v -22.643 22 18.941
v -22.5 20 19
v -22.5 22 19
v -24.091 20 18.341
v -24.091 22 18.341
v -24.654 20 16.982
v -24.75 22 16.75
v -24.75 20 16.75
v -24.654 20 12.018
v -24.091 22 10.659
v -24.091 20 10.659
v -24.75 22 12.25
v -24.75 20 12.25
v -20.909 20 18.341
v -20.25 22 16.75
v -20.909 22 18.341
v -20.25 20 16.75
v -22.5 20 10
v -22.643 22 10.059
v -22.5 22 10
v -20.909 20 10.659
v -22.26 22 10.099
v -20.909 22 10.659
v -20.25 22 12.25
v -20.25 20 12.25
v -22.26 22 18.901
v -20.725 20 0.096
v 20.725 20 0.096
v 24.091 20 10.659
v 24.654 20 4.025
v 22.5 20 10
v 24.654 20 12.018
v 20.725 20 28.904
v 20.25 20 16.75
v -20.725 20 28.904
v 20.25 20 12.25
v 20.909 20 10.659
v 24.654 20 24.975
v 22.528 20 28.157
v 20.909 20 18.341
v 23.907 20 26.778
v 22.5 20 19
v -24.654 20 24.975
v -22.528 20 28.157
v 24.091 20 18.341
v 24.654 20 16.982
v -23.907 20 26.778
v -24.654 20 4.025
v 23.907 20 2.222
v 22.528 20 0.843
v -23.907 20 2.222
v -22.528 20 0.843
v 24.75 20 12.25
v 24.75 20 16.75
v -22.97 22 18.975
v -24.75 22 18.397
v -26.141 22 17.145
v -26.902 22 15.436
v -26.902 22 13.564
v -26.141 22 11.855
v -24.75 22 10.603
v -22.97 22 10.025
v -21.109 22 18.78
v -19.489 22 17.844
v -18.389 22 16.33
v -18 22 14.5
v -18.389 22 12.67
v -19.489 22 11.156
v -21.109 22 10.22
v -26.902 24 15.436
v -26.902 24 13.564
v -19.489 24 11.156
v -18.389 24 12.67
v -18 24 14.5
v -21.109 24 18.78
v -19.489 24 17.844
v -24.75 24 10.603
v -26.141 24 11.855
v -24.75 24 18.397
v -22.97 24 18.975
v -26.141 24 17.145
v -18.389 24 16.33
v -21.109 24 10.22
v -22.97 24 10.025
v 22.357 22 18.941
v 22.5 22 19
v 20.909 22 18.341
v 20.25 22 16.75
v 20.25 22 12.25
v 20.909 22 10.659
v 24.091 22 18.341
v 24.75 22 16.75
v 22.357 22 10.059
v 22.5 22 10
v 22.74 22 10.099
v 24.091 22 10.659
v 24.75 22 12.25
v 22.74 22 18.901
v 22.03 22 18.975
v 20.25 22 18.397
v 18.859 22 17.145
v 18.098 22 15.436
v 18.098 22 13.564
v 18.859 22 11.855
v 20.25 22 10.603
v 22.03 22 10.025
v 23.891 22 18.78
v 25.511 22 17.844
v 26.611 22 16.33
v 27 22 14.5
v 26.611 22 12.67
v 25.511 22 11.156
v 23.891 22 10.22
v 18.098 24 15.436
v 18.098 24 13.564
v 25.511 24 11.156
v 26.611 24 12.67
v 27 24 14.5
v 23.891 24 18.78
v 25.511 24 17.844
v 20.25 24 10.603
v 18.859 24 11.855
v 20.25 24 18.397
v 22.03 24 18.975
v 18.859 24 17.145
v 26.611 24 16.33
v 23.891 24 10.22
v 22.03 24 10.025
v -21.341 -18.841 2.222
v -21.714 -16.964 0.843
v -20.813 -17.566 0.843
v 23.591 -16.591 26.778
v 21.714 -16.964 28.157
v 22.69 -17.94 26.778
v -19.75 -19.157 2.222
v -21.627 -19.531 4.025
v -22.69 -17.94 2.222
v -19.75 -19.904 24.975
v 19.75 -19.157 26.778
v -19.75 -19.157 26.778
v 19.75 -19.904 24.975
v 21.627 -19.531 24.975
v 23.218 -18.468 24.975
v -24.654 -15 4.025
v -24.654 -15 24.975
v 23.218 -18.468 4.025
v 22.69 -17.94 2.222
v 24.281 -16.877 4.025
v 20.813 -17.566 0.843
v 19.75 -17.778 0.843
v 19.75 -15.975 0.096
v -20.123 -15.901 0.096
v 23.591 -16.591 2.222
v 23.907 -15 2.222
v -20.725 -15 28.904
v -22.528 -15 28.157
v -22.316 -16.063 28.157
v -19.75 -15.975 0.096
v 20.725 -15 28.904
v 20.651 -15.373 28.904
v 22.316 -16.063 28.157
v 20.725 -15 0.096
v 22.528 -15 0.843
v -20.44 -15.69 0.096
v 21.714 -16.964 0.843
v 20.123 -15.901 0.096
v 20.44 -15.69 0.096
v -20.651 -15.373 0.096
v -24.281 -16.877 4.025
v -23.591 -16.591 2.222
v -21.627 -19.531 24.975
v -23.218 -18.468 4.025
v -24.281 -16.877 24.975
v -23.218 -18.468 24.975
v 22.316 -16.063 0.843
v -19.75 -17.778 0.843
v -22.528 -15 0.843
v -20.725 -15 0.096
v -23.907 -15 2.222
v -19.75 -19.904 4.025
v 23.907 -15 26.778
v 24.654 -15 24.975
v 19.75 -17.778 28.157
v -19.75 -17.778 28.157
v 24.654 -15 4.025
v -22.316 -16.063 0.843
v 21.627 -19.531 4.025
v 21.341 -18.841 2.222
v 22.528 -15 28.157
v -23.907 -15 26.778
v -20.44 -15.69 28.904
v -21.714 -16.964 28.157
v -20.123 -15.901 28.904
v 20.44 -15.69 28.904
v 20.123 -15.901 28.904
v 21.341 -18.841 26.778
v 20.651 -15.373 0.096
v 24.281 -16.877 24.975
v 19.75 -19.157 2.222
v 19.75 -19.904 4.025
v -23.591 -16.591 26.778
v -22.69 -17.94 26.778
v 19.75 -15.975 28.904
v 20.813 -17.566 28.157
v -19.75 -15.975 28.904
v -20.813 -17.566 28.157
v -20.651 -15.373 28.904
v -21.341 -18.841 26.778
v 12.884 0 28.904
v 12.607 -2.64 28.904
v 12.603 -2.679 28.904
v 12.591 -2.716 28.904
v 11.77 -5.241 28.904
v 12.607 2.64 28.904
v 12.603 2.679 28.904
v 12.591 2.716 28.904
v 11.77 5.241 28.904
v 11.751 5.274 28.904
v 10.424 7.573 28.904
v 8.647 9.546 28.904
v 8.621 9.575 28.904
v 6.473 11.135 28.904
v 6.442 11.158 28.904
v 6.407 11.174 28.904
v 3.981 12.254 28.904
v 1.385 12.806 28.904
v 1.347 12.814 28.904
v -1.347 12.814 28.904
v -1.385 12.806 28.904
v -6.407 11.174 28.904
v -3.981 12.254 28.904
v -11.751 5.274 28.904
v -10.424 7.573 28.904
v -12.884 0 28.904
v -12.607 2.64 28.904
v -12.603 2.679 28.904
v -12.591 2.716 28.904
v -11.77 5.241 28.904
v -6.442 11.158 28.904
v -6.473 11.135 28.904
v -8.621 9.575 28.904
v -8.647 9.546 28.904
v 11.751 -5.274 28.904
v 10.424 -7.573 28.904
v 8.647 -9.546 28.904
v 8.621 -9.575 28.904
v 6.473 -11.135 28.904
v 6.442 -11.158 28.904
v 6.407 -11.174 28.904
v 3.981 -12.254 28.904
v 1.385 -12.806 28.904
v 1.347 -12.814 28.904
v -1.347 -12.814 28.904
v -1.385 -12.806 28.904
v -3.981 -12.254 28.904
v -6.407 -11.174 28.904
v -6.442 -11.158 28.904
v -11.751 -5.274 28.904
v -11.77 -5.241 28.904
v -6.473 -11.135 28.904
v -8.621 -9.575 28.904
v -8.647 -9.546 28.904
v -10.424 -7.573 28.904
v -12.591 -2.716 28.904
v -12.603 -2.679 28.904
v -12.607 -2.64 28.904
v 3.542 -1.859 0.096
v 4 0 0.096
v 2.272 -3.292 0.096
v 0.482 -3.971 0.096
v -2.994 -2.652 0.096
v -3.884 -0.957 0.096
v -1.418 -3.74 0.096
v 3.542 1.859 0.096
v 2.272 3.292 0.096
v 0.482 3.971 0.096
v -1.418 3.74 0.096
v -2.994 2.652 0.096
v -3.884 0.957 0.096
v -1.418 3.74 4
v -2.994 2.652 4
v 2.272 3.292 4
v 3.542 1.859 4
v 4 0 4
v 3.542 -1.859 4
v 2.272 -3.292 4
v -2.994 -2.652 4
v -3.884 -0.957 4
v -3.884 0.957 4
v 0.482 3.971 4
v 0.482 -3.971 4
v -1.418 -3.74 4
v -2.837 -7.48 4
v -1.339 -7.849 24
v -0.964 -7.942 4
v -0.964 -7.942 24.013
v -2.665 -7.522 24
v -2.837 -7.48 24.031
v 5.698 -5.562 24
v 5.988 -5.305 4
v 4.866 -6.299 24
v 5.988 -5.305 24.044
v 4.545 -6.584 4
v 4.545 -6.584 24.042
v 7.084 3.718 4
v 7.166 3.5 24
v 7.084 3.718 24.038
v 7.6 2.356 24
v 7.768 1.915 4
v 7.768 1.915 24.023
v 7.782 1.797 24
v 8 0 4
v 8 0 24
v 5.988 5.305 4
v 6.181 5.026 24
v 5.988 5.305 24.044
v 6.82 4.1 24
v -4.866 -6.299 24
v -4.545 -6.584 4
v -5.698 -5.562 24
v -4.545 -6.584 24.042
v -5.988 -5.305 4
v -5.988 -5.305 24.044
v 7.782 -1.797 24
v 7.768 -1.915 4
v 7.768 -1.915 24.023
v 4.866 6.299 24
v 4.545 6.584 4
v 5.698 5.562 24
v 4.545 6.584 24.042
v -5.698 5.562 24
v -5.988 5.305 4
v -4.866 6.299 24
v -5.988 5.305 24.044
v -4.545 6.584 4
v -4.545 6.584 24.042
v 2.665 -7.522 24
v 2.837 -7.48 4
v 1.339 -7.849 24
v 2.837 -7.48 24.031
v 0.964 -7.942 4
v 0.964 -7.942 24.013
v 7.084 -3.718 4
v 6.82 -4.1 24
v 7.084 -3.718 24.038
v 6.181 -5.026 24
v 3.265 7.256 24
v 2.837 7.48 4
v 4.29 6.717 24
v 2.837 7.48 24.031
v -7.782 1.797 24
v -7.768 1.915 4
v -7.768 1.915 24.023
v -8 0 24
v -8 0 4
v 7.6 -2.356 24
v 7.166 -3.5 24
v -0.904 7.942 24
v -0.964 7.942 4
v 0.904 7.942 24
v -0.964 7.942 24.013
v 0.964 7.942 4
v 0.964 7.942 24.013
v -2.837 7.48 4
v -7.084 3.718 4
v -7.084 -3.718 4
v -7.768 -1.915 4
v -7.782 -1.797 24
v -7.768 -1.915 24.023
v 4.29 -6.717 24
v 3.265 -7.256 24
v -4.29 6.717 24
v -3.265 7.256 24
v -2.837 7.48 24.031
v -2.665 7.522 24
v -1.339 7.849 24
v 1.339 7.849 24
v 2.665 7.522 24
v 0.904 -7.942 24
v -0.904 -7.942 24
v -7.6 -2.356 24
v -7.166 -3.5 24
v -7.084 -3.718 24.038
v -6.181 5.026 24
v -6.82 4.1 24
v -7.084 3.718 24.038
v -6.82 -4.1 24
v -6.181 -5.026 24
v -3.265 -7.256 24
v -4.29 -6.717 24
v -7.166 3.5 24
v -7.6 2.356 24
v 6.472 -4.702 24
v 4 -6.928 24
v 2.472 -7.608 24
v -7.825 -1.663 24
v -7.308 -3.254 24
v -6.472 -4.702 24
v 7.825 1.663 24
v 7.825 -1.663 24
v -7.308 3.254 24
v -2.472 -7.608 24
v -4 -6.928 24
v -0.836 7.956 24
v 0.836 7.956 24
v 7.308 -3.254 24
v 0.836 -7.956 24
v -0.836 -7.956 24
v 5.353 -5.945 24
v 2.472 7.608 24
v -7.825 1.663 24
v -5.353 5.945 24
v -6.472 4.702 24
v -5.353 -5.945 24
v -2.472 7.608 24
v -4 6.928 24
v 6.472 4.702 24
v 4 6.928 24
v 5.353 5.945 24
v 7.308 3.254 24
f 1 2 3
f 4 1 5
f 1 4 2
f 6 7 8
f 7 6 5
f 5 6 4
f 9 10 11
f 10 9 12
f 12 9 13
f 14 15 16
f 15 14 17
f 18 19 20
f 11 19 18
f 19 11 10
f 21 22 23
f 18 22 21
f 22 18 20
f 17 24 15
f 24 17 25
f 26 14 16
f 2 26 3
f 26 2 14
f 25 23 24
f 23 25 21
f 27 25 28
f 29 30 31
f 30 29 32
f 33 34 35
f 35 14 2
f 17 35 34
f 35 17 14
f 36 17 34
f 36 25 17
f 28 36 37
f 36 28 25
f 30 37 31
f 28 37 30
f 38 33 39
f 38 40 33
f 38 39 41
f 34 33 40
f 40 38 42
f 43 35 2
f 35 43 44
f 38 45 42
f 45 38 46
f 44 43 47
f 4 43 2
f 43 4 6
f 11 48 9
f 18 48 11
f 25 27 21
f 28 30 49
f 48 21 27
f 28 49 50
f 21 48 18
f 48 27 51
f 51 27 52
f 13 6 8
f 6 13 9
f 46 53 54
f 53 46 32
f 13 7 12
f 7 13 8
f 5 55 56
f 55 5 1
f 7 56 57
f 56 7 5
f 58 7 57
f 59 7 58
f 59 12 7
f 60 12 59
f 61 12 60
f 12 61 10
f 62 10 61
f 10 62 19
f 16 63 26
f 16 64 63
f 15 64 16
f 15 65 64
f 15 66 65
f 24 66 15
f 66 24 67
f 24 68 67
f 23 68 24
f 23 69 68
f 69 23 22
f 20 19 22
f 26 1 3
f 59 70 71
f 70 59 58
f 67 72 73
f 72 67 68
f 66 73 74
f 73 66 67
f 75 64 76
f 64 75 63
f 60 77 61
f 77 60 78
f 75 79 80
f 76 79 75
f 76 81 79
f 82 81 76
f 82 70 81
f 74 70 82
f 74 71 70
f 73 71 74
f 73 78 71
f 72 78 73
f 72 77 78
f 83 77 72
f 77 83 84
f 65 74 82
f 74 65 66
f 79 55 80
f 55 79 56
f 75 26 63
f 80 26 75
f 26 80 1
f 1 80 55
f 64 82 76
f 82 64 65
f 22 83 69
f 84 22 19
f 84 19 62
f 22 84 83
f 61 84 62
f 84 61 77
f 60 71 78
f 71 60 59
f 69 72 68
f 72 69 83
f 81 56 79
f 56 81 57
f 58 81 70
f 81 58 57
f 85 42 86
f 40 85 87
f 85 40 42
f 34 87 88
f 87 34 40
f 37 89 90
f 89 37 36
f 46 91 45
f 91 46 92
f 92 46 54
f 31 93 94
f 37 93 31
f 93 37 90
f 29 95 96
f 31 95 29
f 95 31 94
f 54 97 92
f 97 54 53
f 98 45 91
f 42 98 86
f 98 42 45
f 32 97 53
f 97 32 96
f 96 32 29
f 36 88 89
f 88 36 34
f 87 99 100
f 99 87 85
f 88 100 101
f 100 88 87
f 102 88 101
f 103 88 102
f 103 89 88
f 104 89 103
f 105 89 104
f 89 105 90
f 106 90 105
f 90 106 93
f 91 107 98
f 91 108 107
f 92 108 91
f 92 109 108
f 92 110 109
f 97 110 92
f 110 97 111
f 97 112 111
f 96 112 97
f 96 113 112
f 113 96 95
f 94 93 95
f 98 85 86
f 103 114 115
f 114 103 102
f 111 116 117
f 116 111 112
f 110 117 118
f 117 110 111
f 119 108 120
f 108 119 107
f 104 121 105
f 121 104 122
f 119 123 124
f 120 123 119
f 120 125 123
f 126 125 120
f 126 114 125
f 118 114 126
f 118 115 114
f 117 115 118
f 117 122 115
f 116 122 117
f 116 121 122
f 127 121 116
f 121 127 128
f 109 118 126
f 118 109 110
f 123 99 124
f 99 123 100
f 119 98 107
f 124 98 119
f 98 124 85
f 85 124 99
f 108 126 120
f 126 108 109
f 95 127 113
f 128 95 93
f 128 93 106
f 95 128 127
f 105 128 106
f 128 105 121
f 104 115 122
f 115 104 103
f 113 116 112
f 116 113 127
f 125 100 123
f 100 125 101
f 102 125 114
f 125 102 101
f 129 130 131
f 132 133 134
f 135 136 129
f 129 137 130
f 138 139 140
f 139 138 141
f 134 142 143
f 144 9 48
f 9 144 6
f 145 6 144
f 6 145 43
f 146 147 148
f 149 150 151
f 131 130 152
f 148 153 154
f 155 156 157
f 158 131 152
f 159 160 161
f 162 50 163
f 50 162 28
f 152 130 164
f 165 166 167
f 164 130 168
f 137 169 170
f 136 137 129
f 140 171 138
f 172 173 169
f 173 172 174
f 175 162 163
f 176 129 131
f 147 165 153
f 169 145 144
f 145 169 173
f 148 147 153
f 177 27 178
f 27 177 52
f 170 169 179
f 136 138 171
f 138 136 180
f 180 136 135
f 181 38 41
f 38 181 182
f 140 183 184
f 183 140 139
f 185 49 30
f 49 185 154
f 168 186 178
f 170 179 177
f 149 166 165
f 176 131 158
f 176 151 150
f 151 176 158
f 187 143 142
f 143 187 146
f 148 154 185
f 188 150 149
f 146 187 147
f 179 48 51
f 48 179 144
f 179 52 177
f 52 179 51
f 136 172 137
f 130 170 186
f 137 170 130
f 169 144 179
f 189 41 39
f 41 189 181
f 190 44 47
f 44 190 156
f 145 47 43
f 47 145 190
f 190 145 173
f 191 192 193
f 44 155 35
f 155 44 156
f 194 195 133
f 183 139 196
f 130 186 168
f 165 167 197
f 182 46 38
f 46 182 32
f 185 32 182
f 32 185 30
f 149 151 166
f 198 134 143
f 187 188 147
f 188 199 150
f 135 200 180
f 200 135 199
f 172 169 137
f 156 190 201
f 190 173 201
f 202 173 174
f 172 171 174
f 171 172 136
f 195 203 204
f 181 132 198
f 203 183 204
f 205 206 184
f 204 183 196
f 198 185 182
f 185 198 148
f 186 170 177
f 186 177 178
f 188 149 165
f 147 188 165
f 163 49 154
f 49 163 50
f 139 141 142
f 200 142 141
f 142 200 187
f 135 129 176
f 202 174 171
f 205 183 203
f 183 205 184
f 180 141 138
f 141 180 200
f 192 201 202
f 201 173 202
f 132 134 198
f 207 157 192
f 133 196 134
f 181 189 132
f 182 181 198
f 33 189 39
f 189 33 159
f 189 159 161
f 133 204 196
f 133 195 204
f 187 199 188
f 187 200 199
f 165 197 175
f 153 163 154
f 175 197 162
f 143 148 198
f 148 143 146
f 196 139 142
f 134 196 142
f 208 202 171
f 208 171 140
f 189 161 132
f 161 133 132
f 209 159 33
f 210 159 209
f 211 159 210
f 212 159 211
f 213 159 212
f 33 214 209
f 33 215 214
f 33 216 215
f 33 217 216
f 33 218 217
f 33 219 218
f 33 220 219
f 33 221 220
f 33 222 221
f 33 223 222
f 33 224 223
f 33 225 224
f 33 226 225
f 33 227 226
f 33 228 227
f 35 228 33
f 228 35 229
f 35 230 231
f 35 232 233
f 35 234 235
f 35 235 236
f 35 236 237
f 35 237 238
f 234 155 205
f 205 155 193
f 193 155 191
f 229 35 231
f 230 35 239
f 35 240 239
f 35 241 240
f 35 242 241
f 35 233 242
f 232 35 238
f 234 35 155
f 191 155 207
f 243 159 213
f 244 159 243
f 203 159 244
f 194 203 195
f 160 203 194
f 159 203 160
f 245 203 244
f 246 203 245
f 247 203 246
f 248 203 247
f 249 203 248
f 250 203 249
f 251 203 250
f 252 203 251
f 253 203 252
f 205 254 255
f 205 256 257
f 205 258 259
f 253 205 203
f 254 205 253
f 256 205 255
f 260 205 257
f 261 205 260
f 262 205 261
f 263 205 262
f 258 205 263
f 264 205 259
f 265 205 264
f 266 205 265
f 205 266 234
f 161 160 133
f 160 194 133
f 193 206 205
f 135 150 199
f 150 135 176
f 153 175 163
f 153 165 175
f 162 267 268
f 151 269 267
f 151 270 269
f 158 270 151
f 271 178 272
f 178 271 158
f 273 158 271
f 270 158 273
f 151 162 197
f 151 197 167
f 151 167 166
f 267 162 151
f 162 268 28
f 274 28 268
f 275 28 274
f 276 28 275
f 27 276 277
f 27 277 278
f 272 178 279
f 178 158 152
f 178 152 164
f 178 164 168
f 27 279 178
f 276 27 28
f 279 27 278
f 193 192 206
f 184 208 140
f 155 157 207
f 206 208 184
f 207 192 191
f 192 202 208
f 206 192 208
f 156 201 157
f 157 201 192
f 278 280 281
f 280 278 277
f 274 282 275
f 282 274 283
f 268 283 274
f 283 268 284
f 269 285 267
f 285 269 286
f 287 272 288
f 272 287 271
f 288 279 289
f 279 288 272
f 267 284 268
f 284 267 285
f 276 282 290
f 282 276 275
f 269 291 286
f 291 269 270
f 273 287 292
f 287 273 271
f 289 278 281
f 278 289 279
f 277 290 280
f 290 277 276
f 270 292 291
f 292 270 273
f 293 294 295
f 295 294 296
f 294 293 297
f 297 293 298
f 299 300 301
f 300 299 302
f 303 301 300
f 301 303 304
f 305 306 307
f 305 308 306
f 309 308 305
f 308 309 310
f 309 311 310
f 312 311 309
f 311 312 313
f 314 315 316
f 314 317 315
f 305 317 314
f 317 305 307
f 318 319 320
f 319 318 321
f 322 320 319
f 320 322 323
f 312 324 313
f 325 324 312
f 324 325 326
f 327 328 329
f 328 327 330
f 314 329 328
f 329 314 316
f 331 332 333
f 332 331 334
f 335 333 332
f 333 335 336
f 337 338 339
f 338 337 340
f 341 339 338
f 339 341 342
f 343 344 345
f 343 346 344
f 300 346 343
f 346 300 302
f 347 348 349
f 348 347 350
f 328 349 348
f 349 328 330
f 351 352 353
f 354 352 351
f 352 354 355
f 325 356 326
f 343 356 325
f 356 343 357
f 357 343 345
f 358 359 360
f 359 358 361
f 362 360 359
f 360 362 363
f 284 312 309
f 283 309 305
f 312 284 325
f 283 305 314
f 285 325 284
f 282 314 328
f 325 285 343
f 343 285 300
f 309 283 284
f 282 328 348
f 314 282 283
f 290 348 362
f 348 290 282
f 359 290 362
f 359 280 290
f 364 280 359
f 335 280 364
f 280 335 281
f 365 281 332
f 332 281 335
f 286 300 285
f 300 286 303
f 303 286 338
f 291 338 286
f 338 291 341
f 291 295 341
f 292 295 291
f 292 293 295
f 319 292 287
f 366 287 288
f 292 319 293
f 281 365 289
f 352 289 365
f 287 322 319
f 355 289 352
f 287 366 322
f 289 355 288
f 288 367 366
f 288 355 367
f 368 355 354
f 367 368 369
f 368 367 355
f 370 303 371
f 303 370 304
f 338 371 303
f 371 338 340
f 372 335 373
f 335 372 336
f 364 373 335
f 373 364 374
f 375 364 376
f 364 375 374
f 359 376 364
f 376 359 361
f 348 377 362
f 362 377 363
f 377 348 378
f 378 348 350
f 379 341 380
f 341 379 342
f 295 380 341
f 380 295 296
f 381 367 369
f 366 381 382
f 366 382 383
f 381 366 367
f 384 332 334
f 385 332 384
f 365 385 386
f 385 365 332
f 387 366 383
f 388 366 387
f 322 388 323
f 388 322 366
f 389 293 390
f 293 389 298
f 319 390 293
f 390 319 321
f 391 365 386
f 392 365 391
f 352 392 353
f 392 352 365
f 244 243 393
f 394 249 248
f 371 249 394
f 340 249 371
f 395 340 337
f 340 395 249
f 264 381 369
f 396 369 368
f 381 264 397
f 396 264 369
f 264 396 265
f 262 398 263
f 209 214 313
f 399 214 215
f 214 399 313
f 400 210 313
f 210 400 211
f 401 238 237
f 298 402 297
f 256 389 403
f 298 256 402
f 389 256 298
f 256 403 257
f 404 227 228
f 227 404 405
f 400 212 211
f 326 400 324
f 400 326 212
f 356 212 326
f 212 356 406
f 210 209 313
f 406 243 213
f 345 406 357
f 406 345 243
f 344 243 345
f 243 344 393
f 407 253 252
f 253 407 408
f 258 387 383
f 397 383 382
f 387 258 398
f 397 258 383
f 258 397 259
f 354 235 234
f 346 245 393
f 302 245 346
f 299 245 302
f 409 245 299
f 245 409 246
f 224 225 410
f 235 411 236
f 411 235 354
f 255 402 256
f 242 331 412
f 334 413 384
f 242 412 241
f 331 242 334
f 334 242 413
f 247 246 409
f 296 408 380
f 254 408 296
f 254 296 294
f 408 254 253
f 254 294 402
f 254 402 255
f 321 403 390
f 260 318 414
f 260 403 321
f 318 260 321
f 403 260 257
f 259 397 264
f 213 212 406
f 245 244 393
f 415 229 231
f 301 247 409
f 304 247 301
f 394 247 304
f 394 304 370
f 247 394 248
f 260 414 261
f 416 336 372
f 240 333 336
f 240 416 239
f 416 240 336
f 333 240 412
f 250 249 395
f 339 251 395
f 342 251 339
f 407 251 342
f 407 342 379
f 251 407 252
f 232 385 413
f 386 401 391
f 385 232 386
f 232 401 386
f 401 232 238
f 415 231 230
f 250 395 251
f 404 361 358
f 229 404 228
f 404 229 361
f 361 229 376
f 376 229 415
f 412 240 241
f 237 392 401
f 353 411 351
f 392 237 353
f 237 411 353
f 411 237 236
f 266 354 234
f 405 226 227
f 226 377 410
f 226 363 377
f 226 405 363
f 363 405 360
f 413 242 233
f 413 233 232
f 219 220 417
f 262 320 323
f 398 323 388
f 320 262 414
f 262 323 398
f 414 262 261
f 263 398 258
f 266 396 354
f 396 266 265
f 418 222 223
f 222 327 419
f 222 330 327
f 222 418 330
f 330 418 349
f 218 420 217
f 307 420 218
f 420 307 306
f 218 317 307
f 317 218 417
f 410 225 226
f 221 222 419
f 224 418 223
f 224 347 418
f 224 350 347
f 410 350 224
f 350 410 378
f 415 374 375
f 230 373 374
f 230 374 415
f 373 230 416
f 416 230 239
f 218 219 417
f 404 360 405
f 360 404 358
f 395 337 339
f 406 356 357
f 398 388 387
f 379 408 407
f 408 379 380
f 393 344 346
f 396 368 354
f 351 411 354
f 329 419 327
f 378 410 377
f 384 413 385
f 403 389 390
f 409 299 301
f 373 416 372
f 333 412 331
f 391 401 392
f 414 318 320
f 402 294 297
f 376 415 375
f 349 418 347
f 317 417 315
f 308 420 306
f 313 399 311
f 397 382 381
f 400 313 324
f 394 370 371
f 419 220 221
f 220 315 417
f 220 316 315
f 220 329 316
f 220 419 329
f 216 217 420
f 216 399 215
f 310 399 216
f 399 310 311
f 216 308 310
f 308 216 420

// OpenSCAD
// file: peg.scad
pegSlot = 5; // the small opening it slides into
pegD = 9;    // the large opening to put it into
pegH = 22;   // top of large opening to bottom of small opening

holeD = 3.75; // "screw" holes

holeSpacingX = 15;
holeSpacingY = 14.5; // yes, this is actually not a grid. go figure
pegSpacingX = 3 * holeSpacingX;
pegSpacingY = 4 * holeSpacingY;

module peg(t = 2, clearance = 2)
{
    D = pegD;
    d = 4.5;

    rotate([ -90, 0, 0 ])
    {
        hull()
        {
            translate([ 0, (D - d) / 2, 0 ]) cylinder(h = clearance, d = d);
            translate([ 0, -(D - d) / 2, 0 ]) cylinder(h = clearance, d = d);
        }
        translate([ 0, 0, clearance ]) cylinder(h = t, d = D);
    }
}

module pegs(n, t = 2, clearance = 2)
{
    pegSpacingX = 45;
    x0 = ((1 - n) * pegSpacingX) / 2;
    for (i = [0:(n - 1)])
    {
        translate([ x0 + i * pegSpacingX, 0, 0 ]) peg(t, clearance);
    }
}
// main file
include<peg.scad>;

wera7400();
module wera7400(t = 4, rounding = 5)
{
    hole = 8; // loosly fit 1/4" bits
    d = 16;

    H = 25 + t;
    W = 40;
    L = 49.5;
    translate([ 0, W / 2, H / 2 ]) pegs(2);
    difference()
    {
        minkowski()
        {
            l = L - 2 * rounding;
            w = W - rounding;
            translate([ -l / 2, rounding / 2 - w / 2, rounding ]) cube([ l, w, H - 2 * rounding ]);
            difference()
            {
                sphere(r = rounding);
                translate([ -rounding - .01, 0, -rounding - .01 ]) cube(2 * rounding + .02);
            }
        }
        translate([ 0, 0, -.01 ]) cylinder(h = H + .02, d = hole);
        translate([ 0, 0, t ]) cylinder(h = H - t + .02, d = d);
        translate([ 0, 0, H - rounding ]) cylinder(h = rounding + .02, d1 = d, d2 = d + 2 * rounding);
    }
}
